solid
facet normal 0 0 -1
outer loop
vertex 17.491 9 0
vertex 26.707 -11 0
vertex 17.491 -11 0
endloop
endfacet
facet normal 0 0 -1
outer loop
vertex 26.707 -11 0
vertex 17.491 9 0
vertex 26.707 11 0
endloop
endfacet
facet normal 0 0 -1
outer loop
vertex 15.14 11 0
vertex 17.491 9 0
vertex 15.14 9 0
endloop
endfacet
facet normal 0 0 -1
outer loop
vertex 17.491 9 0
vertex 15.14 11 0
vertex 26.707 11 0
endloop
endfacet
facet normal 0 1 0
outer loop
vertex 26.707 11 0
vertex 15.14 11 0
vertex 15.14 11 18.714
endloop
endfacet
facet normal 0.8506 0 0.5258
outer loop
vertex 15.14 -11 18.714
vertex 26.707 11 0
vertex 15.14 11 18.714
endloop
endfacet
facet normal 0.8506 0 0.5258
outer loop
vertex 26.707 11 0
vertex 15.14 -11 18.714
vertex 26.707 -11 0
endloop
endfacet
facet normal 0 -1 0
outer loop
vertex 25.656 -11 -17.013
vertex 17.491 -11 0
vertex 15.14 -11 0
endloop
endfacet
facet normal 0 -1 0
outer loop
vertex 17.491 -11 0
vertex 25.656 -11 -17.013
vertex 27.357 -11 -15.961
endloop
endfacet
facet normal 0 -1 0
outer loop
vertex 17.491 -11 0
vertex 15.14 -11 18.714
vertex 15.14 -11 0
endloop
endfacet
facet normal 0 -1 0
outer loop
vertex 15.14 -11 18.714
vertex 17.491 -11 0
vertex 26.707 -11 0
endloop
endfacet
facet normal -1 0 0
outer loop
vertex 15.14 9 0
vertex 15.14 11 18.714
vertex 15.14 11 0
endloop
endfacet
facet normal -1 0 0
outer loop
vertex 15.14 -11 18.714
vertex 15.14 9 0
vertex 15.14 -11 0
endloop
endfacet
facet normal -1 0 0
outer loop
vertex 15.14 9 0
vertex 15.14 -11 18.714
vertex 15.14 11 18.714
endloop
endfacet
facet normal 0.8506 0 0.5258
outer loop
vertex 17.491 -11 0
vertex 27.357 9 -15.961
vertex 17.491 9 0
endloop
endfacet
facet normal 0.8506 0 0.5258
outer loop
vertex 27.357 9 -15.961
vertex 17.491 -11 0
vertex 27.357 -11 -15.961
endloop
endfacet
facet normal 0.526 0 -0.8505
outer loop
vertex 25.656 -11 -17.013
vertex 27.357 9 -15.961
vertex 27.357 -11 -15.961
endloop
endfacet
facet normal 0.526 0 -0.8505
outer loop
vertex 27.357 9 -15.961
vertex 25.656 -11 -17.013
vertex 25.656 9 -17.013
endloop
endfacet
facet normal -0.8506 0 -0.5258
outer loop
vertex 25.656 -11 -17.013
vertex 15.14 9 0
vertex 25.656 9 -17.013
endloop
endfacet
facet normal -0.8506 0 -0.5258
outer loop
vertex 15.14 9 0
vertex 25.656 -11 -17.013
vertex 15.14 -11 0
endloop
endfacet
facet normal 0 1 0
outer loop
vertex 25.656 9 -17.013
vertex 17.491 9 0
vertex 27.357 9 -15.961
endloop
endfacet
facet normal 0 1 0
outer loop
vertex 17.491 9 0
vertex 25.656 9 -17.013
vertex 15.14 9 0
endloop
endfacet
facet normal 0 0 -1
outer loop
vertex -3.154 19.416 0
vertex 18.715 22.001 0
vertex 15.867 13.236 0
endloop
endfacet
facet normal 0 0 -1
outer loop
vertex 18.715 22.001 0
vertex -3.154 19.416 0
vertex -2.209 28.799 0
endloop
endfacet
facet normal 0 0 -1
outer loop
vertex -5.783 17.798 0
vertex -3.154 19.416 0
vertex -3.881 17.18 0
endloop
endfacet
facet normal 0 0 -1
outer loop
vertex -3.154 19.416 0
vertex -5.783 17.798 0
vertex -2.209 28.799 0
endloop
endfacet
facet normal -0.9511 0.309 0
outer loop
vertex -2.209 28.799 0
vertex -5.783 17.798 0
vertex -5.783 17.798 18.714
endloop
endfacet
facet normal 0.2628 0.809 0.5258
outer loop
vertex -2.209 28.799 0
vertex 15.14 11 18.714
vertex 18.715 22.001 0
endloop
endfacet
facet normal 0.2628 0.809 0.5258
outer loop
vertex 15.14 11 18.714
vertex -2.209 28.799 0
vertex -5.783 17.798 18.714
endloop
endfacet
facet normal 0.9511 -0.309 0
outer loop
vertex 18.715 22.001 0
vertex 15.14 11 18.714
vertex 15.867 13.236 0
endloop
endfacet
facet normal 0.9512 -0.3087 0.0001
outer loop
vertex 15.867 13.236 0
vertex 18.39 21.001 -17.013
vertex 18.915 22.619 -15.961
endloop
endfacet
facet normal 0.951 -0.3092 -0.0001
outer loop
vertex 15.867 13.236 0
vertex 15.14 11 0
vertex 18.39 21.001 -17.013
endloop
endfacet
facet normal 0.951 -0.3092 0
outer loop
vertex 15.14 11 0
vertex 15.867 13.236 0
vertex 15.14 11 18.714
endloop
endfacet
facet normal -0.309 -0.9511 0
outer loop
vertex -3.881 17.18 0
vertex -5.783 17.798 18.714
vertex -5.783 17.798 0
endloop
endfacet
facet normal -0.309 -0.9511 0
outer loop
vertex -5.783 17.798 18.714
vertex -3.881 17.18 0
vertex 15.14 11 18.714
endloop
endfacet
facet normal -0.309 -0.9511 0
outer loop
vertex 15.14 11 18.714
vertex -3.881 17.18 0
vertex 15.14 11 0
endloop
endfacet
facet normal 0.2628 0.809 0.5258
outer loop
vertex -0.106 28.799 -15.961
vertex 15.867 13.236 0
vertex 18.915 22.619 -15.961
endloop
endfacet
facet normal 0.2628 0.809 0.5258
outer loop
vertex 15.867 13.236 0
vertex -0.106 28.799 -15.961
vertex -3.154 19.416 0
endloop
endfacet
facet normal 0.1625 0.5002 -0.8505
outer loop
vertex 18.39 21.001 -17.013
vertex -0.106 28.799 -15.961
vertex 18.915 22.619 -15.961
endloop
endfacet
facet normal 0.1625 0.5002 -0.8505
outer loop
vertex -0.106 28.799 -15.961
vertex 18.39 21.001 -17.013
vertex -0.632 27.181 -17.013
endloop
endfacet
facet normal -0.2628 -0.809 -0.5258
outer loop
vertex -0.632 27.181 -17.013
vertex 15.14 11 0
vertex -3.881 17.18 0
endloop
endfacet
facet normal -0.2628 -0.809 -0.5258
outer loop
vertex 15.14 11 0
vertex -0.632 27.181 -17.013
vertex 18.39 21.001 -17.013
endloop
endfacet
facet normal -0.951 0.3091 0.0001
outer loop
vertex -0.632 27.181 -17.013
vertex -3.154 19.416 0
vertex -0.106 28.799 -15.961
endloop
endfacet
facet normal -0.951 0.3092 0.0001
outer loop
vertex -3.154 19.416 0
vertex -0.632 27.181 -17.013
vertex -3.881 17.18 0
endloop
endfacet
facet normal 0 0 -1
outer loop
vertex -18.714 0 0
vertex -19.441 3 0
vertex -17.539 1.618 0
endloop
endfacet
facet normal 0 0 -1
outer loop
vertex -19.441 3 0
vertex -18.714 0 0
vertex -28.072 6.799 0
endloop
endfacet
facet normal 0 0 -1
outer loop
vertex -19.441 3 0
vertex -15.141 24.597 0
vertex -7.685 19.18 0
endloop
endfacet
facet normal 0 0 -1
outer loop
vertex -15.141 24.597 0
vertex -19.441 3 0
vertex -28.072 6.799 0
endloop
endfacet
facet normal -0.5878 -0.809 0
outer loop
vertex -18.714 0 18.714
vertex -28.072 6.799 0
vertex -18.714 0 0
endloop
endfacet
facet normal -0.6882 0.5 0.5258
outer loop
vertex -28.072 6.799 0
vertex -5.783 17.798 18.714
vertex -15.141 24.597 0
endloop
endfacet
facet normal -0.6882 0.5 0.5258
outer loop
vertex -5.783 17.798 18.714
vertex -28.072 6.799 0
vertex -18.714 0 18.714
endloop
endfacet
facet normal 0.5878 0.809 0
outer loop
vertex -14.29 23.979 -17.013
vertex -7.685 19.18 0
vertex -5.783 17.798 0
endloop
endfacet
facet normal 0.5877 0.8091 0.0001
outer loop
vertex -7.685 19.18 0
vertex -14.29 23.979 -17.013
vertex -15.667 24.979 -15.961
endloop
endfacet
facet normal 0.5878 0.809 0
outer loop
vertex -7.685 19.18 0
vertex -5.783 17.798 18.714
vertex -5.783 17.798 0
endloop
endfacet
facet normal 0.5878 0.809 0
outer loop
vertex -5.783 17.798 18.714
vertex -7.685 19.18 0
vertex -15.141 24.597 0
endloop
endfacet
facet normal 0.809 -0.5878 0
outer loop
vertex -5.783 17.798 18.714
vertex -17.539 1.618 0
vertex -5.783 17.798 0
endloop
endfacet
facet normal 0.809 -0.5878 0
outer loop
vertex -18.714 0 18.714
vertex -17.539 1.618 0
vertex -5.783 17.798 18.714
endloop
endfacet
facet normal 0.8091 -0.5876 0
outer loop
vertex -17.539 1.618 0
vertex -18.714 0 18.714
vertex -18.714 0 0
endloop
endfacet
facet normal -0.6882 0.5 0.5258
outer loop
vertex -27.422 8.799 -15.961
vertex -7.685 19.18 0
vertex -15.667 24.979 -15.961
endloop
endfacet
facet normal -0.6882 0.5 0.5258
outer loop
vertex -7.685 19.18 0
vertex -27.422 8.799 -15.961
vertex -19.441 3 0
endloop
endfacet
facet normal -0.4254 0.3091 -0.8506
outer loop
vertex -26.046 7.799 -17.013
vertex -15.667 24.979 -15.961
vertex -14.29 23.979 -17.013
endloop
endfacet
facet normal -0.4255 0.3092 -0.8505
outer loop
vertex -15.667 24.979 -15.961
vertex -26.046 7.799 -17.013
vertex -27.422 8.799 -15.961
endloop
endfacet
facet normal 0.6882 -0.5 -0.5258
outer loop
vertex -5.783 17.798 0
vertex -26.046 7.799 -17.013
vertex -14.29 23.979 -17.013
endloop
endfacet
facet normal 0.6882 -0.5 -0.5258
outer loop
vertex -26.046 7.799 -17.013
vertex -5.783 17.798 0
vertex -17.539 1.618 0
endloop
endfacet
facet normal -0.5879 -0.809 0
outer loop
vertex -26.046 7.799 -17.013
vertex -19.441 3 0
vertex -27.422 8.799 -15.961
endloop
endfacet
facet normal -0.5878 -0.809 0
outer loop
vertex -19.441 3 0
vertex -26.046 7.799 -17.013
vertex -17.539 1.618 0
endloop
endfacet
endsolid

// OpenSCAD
connector_angle=90-31.72;

interface_width=20;
interface_height=20;
interface_depth=2;

interface_spacing_width=1;
interface_spacing_height=1;

sides=5;
sides_to_draw = 3;//sides;
inner_wall = 0;
base_wall=0;

face_width=interface_width+(2*interface_spacing_width);
face_height=interface_height+(2*interface_spacing_height);

connector_height = face_width     * sin(connector_angle);
connector_width  = face_width     * cos(connector_angle);
inner_radius     = (face_width/2) / sin(360/(sides*2));
inner_apothem    = (face_width/2) / tan(360/(sides*2));
outer_radius     = inner_radius  + connector_width;
outer_apothem    = inner_apothem + connector_width;
angle            = (360/sides);


assemble_connector();

module assemble_connector(){
	connector();	
}

module connector(){
	for (i=[0:sides_to_draw-1]){
		rotate([0,0,i*angle]){	
			translate([inner_wall+inner_apothem,-face_width/2,0]){
			  strut_interface();
                rotate([0,connector_angle,0])/*translate([connector_width-interface_width,interface_spacing_width, -interface_depth])*/cube([
                interface_width, 
                interface_height,
                interface_depth]);
			  //corner_bevel(angle);	
			}
		}
	}
}

module strut_interface(){
	id = face_width;
	iw = inner_wall;
	ch = connector_height;
  cw = connector_width;
	bw = base_wall;
	interfacePoints = [
  	[  0,  0,  0 ],//0 
    [  0, id,  0 ],//1
	 	[ cw, id,  0 ],//2 
		[ cw,  0,  0 ],//3 	  
		[  0, id, ch ],//4
		[  0,  0, ch ]	//5
	];     
	interfaceFaces = [
  	  [ 0, 1, 2, 3 ],
  	  [ 1, 5, 4, 2 ],  
	  [ 3, 4, 5, 0 ],
	  [ 0, 5, 1 ],
	  [ 2, 4, 3 ],
	];	
	innerWallPoints=[
	  [ -iw,  0,  0 ],
	  [   0,  0,  0 ],
	  [   0, id,  0 ],
	  [ -iw, id,  0 ],
	  [ -iw,  0, ch ],
	  [   0,  0, ch ],
	  [   0, id, ch ],
	  [ -iw, id, ch ],
	]; 
	innerWallFaces = [
		[ 0, 1, 2, 3 ],
		[ 0, 4, 5, 1 ],
		[ 1, 5, 6, 2 ],
		[ 2, 6, 7, 3 ],
		[ 0, 3, 7, 4 ],
		[ 4, 7, 6, 5 ]
	]; 
	baseWallPoints =[
		[ -iw,  0,   0 ],
		[  cw,  0,   0 ],
		[  cw, id,   0 ],
		[ -iw, id,   0 ],
		[ -iw,  0, -bw ],
		[  cw,  0, -bw ],
		[  cw, id, -bw ],
		[ -iw, id, -bw ],
	];
	baseWallFaces =[
		[ 0, 1, 2, 3 ],
		[ 0, 4, 5, 1 ],
		[ 1, 5, 6, 2 ],
		[ 2, 6, 7, 3 ],
		[ 0, 3, 7, 4 ],
		[ 4, 7, 6, 5 ]		
	];
	polyhedron( baseWallPoints,  baseWallFaces );	
	polyhedron( interfacePoints, interfaceFaces );
    polyhedron( innerWallPoints, innerWallFaces );
}



module corner_bevel(){
	translate([0,face_width,0]){
		cw=connector_width;
		ch=connector_height;
		iw=inner_wall;	
		bw=base_wall;
		ox = (cos(angle) * (iw+cw))-iw;
		oy = (sin(angle) * (iw+cw)); 
		ix = (cos(angle) * iw) - iw;
		iy = (sin(angle) * iw);

		points = [
			[ -iw,   0,  0 ], //0
  		[   0,   0,  0 ], //1 
  		[  cw,   0,  0 ], //2 
  		[  ox,  oy,  0 ], //3 
  		[  ix,  iy,  0 ], //4
			[ -iw,   0, ch ], //6
			[   0,   0, ch ], //
			[  ix,  iy, ch ], //4
		]; 
    
		faces = [
  		[ 0, 1, 2, 3, 4 ],
			[ 0, 5, 6, 2, 1 ],
			[ 0, 4, 3 ,7, 5 ],
			[ 2, 6, 7, 3 ],
			[ 5, 7, 6 ],
		];
		
		
		baseWallPoints =[
			[ -iw,  0, -bw ], //0
  		[   0,  0, -bw ], //1 
  		[  cw,  0, -bw ], //2 
  		[  ox, oy, -bw ], //3 
  		[  ix, iy, -bw ], //4
			[ -iw,  0,   0 ], //5
  		[   0,  0,   0 ], //6 
  		[  cw,  0,   0 ], //7 
  		[  ox, oy,   0 ], //8 
  		[  ix, iy,   0 ], //9
			

		];
		
		baseWallFaces =[
			[0,1,2,3,4],
			[0,5,6,7,2,1],
			[2,7,8,3],
			[0,4,3,8,5],
			[5,9,8,7,6],
			[0,4,3,8,5],
		];
		
		polyhedron( baseWallPoints,  baseWallFaces );	
  	polyhedron( points, faces );	
	}
}
